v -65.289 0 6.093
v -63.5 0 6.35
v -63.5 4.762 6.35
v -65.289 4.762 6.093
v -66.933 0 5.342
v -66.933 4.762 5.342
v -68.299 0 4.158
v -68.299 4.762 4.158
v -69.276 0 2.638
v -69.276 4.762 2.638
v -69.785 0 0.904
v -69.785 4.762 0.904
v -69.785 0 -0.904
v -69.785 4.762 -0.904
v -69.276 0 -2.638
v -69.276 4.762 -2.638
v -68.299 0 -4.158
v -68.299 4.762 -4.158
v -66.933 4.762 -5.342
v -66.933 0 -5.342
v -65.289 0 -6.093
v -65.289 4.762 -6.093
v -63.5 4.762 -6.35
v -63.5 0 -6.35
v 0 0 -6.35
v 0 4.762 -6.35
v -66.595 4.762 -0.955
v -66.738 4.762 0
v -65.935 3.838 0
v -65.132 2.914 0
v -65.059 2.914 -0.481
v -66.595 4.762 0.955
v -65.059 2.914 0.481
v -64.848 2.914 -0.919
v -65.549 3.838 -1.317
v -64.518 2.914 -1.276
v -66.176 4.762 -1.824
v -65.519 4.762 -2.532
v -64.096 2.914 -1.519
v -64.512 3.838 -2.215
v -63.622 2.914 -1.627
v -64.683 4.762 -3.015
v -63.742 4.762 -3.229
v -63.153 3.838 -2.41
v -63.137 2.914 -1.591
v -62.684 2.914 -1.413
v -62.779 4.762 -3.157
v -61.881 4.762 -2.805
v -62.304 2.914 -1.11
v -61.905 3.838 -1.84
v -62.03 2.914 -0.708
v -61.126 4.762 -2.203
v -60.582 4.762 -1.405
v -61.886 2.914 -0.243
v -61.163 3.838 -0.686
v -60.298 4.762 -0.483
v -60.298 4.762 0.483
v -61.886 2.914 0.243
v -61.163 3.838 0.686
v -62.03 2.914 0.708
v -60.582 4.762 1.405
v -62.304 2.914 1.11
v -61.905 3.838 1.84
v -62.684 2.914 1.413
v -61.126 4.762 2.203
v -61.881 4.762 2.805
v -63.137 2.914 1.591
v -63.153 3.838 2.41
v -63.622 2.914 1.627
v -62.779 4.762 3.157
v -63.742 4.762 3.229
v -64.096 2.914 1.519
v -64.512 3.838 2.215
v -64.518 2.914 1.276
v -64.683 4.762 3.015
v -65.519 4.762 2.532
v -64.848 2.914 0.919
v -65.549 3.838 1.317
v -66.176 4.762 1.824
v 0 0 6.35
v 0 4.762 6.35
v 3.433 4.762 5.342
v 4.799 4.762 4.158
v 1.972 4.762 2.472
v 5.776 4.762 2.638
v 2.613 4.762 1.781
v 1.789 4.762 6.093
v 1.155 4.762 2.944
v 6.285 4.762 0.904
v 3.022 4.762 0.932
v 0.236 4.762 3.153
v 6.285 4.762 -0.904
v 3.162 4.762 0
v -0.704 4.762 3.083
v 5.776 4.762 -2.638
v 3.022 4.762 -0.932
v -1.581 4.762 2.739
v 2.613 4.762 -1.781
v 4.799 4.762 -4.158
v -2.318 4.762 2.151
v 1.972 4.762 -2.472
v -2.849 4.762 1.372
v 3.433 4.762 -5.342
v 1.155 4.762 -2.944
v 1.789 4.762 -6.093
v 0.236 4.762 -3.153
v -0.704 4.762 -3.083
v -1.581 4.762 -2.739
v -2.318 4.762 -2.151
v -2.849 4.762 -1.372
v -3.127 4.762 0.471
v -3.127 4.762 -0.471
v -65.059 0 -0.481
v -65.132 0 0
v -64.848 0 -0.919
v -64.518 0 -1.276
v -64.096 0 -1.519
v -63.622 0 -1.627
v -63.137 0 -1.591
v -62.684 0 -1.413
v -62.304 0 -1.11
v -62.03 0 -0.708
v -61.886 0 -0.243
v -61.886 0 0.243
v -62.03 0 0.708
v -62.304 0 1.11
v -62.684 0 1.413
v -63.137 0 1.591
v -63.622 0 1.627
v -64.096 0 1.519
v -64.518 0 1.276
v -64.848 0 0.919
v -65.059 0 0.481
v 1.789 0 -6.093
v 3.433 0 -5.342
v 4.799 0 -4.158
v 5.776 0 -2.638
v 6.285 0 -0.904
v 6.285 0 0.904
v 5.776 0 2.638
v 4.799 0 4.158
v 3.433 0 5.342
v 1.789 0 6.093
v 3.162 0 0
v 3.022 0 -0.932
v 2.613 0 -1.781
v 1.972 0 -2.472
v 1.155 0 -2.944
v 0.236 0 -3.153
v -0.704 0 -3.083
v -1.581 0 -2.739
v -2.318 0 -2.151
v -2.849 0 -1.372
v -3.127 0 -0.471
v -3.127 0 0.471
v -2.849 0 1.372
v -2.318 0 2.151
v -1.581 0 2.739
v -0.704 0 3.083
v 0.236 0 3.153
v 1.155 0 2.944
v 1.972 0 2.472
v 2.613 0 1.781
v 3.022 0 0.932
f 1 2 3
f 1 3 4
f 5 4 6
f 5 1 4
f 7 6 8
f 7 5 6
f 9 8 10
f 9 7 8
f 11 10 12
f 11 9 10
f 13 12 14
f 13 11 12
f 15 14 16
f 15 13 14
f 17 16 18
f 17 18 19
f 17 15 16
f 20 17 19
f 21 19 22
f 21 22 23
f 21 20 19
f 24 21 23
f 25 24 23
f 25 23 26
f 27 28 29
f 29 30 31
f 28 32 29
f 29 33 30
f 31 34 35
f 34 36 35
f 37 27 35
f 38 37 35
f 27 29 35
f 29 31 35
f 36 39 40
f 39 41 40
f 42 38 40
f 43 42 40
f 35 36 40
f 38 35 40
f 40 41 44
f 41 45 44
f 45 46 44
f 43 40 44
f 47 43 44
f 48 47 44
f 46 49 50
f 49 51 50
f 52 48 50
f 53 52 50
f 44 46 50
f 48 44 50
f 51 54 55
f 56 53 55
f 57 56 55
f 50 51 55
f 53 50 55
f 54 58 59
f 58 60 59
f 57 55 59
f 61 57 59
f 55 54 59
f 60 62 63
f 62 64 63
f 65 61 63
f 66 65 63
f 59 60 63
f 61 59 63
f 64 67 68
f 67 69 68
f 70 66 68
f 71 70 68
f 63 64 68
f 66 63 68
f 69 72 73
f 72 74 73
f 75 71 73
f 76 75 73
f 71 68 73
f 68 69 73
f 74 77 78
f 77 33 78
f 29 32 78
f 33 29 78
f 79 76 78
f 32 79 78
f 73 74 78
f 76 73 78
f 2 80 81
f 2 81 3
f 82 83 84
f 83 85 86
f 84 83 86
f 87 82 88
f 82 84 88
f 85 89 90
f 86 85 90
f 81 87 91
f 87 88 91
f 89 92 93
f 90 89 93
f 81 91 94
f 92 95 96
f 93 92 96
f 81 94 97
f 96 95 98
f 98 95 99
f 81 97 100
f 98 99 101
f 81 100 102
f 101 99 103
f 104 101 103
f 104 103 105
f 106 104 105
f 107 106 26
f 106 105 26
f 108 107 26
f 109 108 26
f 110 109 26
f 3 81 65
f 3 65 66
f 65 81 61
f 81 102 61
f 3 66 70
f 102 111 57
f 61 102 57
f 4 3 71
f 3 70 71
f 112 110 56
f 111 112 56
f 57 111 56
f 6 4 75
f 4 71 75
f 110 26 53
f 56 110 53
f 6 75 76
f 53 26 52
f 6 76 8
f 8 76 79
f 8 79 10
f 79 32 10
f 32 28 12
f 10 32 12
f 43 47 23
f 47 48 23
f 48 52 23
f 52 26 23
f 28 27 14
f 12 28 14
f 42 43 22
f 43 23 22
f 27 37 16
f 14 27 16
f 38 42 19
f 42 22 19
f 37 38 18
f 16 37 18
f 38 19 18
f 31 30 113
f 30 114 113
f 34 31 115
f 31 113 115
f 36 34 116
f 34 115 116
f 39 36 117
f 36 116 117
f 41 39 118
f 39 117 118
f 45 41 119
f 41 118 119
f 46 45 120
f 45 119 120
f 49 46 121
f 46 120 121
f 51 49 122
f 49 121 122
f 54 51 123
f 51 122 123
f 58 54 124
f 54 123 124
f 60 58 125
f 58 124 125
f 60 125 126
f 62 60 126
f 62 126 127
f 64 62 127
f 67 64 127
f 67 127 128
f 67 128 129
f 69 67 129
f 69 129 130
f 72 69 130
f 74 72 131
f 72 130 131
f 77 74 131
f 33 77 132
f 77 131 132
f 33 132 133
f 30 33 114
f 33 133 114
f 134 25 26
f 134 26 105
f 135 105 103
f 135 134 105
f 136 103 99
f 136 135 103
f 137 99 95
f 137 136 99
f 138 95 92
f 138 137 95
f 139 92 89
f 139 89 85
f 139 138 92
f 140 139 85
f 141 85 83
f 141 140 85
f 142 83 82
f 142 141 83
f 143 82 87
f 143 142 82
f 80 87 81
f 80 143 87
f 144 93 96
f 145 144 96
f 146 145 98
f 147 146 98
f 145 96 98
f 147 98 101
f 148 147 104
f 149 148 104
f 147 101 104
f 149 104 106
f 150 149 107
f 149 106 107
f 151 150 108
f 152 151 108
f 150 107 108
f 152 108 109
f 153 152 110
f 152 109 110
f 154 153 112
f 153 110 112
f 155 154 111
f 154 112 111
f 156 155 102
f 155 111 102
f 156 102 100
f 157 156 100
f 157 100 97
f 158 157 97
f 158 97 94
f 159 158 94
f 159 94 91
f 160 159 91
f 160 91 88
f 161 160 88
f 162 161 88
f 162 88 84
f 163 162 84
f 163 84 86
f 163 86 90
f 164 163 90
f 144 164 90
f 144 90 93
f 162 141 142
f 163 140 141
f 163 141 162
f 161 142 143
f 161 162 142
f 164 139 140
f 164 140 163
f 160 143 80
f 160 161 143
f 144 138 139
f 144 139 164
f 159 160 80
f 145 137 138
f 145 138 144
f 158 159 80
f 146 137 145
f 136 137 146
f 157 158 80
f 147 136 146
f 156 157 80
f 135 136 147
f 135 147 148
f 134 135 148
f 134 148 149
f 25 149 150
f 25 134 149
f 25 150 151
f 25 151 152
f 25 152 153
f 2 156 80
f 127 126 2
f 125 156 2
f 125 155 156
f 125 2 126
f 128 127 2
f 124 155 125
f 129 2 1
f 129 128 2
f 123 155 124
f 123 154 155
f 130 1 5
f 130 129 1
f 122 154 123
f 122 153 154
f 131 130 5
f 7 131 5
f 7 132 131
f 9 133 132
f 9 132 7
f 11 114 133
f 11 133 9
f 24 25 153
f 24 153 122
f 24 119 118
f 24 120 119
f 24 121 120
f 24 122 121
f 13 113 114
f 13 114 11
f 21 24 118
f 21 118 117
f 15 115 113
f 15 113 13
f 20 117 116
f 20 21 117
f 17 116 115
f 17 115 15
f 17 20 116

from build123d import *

# Parameters (mm, degrees)
BOSS_EXTRUDE2_DEPTH                               = 4.7625
SKETCH2_R                                         = 3.1623
CUT_EXTRUDE1_DEPTH                                = 5.7625
CSK_FOR_4_FLAT_HEAD_SOCKET_CAP_SCREW1_D           = 3.2639
CSK_FOR_4_FLAT_HEAD_SOCKET_CAP_SCREW1_CSINK_D     = 6.477
CSK_FOR_4_FLAT_HEAD_SOCKET_CAP_SCREW1_CSINK_ANGLE = 82


with BuildPart() as part:
    # Sketch1 → Boss-Extrude2 (new body)
    with BuildSketch(Plane(origin=(0, 0, 0), x_dir=(1, 0, 0), z_dir=(0, 1, 0))):
        with BuildLine():
            Line((-63.5, 6.35), (0, 6.35))
            ThreePointArc((0, 6.35), (6.35, 0), (0, -6.35))
            Line((0, -6.35), (-63.5, -6.35))
            ThreePointArc((-63.5, -6.35), (-69.85, 0), (-63.5, 6.35))
        make_face()
    extrude(amount=BOSS_EXTRUDE2_DEPTH)

    # Sketch2 → Cut-Extrude1 (cut, through all)
    with BuildSketch(Plane(origin=(0, 4.7625, 0), x_dir=(1, 0, 0), z_dir=(0, 1, 0))):
        Circle(SKETCH2_R)
    extrude(amount=-CUT_EXTRUDE1_DEPTH, mode=Mode.SUBTRACT)

    # CSK for #4 Flat Head Socket Cap Screw1 (through all)
    with Locations(Plane(origin=(0, 4.7625, 0), x_dir=(1, 0, 0), z_dir=(0, 1, 0))):
        with Locations((-63.5, 0)):
            CounterSinkHole(CSK_FOR_4_FLAT_HEAD_SOCKET_CAP_SCREW1_D / 2, CSK_FOR_4_FLAT_HEAD_SOCKET_CAP_SCREW1_CSINK_D / 2, counter_sink_angle=CSK_FOR_4_FLAT_HEAD_SOCKET_CAP_SCREW1_CSINK_ANGLE)


solid = part.part
